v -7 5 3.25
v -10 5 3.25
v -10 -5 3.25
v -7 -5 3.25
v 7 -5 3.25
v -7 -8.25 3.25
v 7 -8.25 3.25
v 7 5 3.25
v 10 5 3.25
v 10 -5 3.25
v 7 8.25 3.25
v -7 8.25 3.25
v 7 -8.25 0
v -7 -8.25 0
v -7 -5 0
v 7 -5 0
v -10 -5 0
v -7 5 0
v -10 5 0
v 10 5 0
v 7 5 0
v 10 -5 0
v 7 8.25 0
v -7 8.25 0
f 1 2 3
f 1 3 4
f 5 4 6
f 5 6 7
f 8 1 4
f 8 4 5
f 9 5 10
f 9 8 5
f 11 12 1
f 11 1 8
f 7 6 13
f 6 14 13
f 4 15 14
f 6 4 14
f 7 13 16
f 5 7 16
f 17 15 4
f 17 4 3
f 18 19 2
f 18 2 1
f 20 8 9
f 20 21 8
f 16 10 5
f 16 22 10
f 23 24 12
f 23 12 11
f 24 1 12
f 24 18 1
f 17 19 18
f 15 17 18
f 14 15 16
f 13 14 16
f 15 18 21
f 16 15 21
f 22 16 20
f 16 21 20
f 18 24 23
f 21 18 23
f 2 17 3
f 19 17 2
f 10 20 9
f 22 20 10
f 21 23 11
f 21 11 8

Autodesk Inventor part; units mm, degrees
ref_plane "YZ Plane" through (0, 0, 0) normal (1, 0, 0) x (0, 1, 0)
ref_plane "XZ Plane" through (0, 0, 0) normal (0, 1, 0) x (-1, 0, 0)
ref_plane "XY Plane" through (0, 0, 0) normal (0, 0, 1) x (1, 0, 0)
sketch "Block1" plane through (0, 0, 0) normal (0, 0, 1) x (1, 0, 0)
  circle A0 centre (74.029, 24.2723) radius 1
  line L0 (49.279, 30.4723) -> (71.779, 30.4723)
  line L1 (71.779, 30.4723) -> (71.779, 18.0723)
  line L2 (71.779, 18.0723) -> (49.279, 18.0723)
  line L3 (49.279, 18.0723) -> (49.279, 30.4723)
  line L4 (49.279, 30.4723) -> (44.779, 30.4723)
  line L5 (44.779, 30.4723) -> (44.779, 18.0723)
  line L6 (44.779, 18.0723) -> (49.279, 18.0723)
  line L7 (49.279, 18.0723) -> (49.279, 30.4723)
  line L8 (71.779, 30.4723) -> (76.279, 30.4723)
  line L9 (76.279, 30.4723) -> (76.279, 18.0723)
  line L10 (76.279, 18.0723) -> (71.779, 18.0723)
  line L11 (71.779, 18.0723) -> (71.779, 30.4723)
  line L12 (44.779, 24.2723) -> (76.279, 24.2723) construction
  line L13 (47.029, 30.4723) -> (47.029, 18.0723) construction
  circle A1 centre (47.029, 24.2723) radius 1
  line L14 (74.029, 30.4723) -> (74.029, 18.0723) construction
  point P0 (60.979, 24.0984)
  dimension "d7" = 22.5
  dimension "d8" = 12.4
  dimension "d9" = 4.5
  dimension "d10" = 4.5
  dimension "d11" = 2
  dimension "d12" = 2
sketch "Sketch1" plane through (0, 0, 0) normal (0, 0, 1) x (1, 0, 0)
  line L0 (-92.7646, -8.503) -> (-89.7646, -8.503)
  line L1 (-89.7646, -8.503) -> (-89.7646, -11.753)
  line L2 (-89.7646, -11.753) -> (-92.7646, -11.753)
  line L3 (-92.7646, -11.753) -> (-92.7646, -8.503)
  line L4 (-92.7646, -21.6527) -> (-89.7646, -21.6527)
  line L5 (-89.7646, -21.6527) -> (-89.7646, -21.7527)
  line L6 (-89.7646, -21.7527) -> (-92.7646, -21.7527)
  line L7 (-92.7646, -21.7527) -> (-92.7646, -21.6527)
  line L8 (-7, -8.25) -> (7, -8.25)
  line L9 (7, -8.25) -> (7, -5)
  line L10 (7, -5) -> (-7, -5)
  line L11 (-7, -5) -> (-7, -8.25)
  line L12 (-10, 5) -> (10, 5)
  line L13 (10, 5) -> (10, -5)
  line L14 (10, -5) -> (-10, -5)
  line L15 (-10, -5) -> (-10, 5)
  line L16 (0, -5) -> (0, 5) construction
  line L17 (0, -5) -> (0, -8.25) construction
  line L18 (-10, 0) -> (10, 0) construction
  line L19 (-7, 8.25) -> (7, 8.25)
  line L20 (7, 8.25) -> (7, 5)
  line L21 (7, 5) -> (-7, 5)
  line L22 (-7, 5) -> (-7, 8.25)
  line L23 (0, 5) -> (0, -5) construction
  line L24 (0, 5) -> (0, 8.25) construction
  point P0 (0, 0)
  dimension "d0" = 3
  dimension "mat" = 3.25
  dimension "d2" = 3
  dimension "d3" = 0.1
  dimension "d34" = 14
  dimension "d35" = 3.25
  dimension "d36" = 20
  dimension "d37" = 10
extrude "Extrusion4" add sketch "Sketch1" along normal blind 3.25 contours L11 L10 L9 L8 | L14 L15 L12 L13 L10 | L22 L19 L20 L12
equation "\"d35\" = mat"
equation "\"d38\" = mat"
properties part number "arm-servo"
